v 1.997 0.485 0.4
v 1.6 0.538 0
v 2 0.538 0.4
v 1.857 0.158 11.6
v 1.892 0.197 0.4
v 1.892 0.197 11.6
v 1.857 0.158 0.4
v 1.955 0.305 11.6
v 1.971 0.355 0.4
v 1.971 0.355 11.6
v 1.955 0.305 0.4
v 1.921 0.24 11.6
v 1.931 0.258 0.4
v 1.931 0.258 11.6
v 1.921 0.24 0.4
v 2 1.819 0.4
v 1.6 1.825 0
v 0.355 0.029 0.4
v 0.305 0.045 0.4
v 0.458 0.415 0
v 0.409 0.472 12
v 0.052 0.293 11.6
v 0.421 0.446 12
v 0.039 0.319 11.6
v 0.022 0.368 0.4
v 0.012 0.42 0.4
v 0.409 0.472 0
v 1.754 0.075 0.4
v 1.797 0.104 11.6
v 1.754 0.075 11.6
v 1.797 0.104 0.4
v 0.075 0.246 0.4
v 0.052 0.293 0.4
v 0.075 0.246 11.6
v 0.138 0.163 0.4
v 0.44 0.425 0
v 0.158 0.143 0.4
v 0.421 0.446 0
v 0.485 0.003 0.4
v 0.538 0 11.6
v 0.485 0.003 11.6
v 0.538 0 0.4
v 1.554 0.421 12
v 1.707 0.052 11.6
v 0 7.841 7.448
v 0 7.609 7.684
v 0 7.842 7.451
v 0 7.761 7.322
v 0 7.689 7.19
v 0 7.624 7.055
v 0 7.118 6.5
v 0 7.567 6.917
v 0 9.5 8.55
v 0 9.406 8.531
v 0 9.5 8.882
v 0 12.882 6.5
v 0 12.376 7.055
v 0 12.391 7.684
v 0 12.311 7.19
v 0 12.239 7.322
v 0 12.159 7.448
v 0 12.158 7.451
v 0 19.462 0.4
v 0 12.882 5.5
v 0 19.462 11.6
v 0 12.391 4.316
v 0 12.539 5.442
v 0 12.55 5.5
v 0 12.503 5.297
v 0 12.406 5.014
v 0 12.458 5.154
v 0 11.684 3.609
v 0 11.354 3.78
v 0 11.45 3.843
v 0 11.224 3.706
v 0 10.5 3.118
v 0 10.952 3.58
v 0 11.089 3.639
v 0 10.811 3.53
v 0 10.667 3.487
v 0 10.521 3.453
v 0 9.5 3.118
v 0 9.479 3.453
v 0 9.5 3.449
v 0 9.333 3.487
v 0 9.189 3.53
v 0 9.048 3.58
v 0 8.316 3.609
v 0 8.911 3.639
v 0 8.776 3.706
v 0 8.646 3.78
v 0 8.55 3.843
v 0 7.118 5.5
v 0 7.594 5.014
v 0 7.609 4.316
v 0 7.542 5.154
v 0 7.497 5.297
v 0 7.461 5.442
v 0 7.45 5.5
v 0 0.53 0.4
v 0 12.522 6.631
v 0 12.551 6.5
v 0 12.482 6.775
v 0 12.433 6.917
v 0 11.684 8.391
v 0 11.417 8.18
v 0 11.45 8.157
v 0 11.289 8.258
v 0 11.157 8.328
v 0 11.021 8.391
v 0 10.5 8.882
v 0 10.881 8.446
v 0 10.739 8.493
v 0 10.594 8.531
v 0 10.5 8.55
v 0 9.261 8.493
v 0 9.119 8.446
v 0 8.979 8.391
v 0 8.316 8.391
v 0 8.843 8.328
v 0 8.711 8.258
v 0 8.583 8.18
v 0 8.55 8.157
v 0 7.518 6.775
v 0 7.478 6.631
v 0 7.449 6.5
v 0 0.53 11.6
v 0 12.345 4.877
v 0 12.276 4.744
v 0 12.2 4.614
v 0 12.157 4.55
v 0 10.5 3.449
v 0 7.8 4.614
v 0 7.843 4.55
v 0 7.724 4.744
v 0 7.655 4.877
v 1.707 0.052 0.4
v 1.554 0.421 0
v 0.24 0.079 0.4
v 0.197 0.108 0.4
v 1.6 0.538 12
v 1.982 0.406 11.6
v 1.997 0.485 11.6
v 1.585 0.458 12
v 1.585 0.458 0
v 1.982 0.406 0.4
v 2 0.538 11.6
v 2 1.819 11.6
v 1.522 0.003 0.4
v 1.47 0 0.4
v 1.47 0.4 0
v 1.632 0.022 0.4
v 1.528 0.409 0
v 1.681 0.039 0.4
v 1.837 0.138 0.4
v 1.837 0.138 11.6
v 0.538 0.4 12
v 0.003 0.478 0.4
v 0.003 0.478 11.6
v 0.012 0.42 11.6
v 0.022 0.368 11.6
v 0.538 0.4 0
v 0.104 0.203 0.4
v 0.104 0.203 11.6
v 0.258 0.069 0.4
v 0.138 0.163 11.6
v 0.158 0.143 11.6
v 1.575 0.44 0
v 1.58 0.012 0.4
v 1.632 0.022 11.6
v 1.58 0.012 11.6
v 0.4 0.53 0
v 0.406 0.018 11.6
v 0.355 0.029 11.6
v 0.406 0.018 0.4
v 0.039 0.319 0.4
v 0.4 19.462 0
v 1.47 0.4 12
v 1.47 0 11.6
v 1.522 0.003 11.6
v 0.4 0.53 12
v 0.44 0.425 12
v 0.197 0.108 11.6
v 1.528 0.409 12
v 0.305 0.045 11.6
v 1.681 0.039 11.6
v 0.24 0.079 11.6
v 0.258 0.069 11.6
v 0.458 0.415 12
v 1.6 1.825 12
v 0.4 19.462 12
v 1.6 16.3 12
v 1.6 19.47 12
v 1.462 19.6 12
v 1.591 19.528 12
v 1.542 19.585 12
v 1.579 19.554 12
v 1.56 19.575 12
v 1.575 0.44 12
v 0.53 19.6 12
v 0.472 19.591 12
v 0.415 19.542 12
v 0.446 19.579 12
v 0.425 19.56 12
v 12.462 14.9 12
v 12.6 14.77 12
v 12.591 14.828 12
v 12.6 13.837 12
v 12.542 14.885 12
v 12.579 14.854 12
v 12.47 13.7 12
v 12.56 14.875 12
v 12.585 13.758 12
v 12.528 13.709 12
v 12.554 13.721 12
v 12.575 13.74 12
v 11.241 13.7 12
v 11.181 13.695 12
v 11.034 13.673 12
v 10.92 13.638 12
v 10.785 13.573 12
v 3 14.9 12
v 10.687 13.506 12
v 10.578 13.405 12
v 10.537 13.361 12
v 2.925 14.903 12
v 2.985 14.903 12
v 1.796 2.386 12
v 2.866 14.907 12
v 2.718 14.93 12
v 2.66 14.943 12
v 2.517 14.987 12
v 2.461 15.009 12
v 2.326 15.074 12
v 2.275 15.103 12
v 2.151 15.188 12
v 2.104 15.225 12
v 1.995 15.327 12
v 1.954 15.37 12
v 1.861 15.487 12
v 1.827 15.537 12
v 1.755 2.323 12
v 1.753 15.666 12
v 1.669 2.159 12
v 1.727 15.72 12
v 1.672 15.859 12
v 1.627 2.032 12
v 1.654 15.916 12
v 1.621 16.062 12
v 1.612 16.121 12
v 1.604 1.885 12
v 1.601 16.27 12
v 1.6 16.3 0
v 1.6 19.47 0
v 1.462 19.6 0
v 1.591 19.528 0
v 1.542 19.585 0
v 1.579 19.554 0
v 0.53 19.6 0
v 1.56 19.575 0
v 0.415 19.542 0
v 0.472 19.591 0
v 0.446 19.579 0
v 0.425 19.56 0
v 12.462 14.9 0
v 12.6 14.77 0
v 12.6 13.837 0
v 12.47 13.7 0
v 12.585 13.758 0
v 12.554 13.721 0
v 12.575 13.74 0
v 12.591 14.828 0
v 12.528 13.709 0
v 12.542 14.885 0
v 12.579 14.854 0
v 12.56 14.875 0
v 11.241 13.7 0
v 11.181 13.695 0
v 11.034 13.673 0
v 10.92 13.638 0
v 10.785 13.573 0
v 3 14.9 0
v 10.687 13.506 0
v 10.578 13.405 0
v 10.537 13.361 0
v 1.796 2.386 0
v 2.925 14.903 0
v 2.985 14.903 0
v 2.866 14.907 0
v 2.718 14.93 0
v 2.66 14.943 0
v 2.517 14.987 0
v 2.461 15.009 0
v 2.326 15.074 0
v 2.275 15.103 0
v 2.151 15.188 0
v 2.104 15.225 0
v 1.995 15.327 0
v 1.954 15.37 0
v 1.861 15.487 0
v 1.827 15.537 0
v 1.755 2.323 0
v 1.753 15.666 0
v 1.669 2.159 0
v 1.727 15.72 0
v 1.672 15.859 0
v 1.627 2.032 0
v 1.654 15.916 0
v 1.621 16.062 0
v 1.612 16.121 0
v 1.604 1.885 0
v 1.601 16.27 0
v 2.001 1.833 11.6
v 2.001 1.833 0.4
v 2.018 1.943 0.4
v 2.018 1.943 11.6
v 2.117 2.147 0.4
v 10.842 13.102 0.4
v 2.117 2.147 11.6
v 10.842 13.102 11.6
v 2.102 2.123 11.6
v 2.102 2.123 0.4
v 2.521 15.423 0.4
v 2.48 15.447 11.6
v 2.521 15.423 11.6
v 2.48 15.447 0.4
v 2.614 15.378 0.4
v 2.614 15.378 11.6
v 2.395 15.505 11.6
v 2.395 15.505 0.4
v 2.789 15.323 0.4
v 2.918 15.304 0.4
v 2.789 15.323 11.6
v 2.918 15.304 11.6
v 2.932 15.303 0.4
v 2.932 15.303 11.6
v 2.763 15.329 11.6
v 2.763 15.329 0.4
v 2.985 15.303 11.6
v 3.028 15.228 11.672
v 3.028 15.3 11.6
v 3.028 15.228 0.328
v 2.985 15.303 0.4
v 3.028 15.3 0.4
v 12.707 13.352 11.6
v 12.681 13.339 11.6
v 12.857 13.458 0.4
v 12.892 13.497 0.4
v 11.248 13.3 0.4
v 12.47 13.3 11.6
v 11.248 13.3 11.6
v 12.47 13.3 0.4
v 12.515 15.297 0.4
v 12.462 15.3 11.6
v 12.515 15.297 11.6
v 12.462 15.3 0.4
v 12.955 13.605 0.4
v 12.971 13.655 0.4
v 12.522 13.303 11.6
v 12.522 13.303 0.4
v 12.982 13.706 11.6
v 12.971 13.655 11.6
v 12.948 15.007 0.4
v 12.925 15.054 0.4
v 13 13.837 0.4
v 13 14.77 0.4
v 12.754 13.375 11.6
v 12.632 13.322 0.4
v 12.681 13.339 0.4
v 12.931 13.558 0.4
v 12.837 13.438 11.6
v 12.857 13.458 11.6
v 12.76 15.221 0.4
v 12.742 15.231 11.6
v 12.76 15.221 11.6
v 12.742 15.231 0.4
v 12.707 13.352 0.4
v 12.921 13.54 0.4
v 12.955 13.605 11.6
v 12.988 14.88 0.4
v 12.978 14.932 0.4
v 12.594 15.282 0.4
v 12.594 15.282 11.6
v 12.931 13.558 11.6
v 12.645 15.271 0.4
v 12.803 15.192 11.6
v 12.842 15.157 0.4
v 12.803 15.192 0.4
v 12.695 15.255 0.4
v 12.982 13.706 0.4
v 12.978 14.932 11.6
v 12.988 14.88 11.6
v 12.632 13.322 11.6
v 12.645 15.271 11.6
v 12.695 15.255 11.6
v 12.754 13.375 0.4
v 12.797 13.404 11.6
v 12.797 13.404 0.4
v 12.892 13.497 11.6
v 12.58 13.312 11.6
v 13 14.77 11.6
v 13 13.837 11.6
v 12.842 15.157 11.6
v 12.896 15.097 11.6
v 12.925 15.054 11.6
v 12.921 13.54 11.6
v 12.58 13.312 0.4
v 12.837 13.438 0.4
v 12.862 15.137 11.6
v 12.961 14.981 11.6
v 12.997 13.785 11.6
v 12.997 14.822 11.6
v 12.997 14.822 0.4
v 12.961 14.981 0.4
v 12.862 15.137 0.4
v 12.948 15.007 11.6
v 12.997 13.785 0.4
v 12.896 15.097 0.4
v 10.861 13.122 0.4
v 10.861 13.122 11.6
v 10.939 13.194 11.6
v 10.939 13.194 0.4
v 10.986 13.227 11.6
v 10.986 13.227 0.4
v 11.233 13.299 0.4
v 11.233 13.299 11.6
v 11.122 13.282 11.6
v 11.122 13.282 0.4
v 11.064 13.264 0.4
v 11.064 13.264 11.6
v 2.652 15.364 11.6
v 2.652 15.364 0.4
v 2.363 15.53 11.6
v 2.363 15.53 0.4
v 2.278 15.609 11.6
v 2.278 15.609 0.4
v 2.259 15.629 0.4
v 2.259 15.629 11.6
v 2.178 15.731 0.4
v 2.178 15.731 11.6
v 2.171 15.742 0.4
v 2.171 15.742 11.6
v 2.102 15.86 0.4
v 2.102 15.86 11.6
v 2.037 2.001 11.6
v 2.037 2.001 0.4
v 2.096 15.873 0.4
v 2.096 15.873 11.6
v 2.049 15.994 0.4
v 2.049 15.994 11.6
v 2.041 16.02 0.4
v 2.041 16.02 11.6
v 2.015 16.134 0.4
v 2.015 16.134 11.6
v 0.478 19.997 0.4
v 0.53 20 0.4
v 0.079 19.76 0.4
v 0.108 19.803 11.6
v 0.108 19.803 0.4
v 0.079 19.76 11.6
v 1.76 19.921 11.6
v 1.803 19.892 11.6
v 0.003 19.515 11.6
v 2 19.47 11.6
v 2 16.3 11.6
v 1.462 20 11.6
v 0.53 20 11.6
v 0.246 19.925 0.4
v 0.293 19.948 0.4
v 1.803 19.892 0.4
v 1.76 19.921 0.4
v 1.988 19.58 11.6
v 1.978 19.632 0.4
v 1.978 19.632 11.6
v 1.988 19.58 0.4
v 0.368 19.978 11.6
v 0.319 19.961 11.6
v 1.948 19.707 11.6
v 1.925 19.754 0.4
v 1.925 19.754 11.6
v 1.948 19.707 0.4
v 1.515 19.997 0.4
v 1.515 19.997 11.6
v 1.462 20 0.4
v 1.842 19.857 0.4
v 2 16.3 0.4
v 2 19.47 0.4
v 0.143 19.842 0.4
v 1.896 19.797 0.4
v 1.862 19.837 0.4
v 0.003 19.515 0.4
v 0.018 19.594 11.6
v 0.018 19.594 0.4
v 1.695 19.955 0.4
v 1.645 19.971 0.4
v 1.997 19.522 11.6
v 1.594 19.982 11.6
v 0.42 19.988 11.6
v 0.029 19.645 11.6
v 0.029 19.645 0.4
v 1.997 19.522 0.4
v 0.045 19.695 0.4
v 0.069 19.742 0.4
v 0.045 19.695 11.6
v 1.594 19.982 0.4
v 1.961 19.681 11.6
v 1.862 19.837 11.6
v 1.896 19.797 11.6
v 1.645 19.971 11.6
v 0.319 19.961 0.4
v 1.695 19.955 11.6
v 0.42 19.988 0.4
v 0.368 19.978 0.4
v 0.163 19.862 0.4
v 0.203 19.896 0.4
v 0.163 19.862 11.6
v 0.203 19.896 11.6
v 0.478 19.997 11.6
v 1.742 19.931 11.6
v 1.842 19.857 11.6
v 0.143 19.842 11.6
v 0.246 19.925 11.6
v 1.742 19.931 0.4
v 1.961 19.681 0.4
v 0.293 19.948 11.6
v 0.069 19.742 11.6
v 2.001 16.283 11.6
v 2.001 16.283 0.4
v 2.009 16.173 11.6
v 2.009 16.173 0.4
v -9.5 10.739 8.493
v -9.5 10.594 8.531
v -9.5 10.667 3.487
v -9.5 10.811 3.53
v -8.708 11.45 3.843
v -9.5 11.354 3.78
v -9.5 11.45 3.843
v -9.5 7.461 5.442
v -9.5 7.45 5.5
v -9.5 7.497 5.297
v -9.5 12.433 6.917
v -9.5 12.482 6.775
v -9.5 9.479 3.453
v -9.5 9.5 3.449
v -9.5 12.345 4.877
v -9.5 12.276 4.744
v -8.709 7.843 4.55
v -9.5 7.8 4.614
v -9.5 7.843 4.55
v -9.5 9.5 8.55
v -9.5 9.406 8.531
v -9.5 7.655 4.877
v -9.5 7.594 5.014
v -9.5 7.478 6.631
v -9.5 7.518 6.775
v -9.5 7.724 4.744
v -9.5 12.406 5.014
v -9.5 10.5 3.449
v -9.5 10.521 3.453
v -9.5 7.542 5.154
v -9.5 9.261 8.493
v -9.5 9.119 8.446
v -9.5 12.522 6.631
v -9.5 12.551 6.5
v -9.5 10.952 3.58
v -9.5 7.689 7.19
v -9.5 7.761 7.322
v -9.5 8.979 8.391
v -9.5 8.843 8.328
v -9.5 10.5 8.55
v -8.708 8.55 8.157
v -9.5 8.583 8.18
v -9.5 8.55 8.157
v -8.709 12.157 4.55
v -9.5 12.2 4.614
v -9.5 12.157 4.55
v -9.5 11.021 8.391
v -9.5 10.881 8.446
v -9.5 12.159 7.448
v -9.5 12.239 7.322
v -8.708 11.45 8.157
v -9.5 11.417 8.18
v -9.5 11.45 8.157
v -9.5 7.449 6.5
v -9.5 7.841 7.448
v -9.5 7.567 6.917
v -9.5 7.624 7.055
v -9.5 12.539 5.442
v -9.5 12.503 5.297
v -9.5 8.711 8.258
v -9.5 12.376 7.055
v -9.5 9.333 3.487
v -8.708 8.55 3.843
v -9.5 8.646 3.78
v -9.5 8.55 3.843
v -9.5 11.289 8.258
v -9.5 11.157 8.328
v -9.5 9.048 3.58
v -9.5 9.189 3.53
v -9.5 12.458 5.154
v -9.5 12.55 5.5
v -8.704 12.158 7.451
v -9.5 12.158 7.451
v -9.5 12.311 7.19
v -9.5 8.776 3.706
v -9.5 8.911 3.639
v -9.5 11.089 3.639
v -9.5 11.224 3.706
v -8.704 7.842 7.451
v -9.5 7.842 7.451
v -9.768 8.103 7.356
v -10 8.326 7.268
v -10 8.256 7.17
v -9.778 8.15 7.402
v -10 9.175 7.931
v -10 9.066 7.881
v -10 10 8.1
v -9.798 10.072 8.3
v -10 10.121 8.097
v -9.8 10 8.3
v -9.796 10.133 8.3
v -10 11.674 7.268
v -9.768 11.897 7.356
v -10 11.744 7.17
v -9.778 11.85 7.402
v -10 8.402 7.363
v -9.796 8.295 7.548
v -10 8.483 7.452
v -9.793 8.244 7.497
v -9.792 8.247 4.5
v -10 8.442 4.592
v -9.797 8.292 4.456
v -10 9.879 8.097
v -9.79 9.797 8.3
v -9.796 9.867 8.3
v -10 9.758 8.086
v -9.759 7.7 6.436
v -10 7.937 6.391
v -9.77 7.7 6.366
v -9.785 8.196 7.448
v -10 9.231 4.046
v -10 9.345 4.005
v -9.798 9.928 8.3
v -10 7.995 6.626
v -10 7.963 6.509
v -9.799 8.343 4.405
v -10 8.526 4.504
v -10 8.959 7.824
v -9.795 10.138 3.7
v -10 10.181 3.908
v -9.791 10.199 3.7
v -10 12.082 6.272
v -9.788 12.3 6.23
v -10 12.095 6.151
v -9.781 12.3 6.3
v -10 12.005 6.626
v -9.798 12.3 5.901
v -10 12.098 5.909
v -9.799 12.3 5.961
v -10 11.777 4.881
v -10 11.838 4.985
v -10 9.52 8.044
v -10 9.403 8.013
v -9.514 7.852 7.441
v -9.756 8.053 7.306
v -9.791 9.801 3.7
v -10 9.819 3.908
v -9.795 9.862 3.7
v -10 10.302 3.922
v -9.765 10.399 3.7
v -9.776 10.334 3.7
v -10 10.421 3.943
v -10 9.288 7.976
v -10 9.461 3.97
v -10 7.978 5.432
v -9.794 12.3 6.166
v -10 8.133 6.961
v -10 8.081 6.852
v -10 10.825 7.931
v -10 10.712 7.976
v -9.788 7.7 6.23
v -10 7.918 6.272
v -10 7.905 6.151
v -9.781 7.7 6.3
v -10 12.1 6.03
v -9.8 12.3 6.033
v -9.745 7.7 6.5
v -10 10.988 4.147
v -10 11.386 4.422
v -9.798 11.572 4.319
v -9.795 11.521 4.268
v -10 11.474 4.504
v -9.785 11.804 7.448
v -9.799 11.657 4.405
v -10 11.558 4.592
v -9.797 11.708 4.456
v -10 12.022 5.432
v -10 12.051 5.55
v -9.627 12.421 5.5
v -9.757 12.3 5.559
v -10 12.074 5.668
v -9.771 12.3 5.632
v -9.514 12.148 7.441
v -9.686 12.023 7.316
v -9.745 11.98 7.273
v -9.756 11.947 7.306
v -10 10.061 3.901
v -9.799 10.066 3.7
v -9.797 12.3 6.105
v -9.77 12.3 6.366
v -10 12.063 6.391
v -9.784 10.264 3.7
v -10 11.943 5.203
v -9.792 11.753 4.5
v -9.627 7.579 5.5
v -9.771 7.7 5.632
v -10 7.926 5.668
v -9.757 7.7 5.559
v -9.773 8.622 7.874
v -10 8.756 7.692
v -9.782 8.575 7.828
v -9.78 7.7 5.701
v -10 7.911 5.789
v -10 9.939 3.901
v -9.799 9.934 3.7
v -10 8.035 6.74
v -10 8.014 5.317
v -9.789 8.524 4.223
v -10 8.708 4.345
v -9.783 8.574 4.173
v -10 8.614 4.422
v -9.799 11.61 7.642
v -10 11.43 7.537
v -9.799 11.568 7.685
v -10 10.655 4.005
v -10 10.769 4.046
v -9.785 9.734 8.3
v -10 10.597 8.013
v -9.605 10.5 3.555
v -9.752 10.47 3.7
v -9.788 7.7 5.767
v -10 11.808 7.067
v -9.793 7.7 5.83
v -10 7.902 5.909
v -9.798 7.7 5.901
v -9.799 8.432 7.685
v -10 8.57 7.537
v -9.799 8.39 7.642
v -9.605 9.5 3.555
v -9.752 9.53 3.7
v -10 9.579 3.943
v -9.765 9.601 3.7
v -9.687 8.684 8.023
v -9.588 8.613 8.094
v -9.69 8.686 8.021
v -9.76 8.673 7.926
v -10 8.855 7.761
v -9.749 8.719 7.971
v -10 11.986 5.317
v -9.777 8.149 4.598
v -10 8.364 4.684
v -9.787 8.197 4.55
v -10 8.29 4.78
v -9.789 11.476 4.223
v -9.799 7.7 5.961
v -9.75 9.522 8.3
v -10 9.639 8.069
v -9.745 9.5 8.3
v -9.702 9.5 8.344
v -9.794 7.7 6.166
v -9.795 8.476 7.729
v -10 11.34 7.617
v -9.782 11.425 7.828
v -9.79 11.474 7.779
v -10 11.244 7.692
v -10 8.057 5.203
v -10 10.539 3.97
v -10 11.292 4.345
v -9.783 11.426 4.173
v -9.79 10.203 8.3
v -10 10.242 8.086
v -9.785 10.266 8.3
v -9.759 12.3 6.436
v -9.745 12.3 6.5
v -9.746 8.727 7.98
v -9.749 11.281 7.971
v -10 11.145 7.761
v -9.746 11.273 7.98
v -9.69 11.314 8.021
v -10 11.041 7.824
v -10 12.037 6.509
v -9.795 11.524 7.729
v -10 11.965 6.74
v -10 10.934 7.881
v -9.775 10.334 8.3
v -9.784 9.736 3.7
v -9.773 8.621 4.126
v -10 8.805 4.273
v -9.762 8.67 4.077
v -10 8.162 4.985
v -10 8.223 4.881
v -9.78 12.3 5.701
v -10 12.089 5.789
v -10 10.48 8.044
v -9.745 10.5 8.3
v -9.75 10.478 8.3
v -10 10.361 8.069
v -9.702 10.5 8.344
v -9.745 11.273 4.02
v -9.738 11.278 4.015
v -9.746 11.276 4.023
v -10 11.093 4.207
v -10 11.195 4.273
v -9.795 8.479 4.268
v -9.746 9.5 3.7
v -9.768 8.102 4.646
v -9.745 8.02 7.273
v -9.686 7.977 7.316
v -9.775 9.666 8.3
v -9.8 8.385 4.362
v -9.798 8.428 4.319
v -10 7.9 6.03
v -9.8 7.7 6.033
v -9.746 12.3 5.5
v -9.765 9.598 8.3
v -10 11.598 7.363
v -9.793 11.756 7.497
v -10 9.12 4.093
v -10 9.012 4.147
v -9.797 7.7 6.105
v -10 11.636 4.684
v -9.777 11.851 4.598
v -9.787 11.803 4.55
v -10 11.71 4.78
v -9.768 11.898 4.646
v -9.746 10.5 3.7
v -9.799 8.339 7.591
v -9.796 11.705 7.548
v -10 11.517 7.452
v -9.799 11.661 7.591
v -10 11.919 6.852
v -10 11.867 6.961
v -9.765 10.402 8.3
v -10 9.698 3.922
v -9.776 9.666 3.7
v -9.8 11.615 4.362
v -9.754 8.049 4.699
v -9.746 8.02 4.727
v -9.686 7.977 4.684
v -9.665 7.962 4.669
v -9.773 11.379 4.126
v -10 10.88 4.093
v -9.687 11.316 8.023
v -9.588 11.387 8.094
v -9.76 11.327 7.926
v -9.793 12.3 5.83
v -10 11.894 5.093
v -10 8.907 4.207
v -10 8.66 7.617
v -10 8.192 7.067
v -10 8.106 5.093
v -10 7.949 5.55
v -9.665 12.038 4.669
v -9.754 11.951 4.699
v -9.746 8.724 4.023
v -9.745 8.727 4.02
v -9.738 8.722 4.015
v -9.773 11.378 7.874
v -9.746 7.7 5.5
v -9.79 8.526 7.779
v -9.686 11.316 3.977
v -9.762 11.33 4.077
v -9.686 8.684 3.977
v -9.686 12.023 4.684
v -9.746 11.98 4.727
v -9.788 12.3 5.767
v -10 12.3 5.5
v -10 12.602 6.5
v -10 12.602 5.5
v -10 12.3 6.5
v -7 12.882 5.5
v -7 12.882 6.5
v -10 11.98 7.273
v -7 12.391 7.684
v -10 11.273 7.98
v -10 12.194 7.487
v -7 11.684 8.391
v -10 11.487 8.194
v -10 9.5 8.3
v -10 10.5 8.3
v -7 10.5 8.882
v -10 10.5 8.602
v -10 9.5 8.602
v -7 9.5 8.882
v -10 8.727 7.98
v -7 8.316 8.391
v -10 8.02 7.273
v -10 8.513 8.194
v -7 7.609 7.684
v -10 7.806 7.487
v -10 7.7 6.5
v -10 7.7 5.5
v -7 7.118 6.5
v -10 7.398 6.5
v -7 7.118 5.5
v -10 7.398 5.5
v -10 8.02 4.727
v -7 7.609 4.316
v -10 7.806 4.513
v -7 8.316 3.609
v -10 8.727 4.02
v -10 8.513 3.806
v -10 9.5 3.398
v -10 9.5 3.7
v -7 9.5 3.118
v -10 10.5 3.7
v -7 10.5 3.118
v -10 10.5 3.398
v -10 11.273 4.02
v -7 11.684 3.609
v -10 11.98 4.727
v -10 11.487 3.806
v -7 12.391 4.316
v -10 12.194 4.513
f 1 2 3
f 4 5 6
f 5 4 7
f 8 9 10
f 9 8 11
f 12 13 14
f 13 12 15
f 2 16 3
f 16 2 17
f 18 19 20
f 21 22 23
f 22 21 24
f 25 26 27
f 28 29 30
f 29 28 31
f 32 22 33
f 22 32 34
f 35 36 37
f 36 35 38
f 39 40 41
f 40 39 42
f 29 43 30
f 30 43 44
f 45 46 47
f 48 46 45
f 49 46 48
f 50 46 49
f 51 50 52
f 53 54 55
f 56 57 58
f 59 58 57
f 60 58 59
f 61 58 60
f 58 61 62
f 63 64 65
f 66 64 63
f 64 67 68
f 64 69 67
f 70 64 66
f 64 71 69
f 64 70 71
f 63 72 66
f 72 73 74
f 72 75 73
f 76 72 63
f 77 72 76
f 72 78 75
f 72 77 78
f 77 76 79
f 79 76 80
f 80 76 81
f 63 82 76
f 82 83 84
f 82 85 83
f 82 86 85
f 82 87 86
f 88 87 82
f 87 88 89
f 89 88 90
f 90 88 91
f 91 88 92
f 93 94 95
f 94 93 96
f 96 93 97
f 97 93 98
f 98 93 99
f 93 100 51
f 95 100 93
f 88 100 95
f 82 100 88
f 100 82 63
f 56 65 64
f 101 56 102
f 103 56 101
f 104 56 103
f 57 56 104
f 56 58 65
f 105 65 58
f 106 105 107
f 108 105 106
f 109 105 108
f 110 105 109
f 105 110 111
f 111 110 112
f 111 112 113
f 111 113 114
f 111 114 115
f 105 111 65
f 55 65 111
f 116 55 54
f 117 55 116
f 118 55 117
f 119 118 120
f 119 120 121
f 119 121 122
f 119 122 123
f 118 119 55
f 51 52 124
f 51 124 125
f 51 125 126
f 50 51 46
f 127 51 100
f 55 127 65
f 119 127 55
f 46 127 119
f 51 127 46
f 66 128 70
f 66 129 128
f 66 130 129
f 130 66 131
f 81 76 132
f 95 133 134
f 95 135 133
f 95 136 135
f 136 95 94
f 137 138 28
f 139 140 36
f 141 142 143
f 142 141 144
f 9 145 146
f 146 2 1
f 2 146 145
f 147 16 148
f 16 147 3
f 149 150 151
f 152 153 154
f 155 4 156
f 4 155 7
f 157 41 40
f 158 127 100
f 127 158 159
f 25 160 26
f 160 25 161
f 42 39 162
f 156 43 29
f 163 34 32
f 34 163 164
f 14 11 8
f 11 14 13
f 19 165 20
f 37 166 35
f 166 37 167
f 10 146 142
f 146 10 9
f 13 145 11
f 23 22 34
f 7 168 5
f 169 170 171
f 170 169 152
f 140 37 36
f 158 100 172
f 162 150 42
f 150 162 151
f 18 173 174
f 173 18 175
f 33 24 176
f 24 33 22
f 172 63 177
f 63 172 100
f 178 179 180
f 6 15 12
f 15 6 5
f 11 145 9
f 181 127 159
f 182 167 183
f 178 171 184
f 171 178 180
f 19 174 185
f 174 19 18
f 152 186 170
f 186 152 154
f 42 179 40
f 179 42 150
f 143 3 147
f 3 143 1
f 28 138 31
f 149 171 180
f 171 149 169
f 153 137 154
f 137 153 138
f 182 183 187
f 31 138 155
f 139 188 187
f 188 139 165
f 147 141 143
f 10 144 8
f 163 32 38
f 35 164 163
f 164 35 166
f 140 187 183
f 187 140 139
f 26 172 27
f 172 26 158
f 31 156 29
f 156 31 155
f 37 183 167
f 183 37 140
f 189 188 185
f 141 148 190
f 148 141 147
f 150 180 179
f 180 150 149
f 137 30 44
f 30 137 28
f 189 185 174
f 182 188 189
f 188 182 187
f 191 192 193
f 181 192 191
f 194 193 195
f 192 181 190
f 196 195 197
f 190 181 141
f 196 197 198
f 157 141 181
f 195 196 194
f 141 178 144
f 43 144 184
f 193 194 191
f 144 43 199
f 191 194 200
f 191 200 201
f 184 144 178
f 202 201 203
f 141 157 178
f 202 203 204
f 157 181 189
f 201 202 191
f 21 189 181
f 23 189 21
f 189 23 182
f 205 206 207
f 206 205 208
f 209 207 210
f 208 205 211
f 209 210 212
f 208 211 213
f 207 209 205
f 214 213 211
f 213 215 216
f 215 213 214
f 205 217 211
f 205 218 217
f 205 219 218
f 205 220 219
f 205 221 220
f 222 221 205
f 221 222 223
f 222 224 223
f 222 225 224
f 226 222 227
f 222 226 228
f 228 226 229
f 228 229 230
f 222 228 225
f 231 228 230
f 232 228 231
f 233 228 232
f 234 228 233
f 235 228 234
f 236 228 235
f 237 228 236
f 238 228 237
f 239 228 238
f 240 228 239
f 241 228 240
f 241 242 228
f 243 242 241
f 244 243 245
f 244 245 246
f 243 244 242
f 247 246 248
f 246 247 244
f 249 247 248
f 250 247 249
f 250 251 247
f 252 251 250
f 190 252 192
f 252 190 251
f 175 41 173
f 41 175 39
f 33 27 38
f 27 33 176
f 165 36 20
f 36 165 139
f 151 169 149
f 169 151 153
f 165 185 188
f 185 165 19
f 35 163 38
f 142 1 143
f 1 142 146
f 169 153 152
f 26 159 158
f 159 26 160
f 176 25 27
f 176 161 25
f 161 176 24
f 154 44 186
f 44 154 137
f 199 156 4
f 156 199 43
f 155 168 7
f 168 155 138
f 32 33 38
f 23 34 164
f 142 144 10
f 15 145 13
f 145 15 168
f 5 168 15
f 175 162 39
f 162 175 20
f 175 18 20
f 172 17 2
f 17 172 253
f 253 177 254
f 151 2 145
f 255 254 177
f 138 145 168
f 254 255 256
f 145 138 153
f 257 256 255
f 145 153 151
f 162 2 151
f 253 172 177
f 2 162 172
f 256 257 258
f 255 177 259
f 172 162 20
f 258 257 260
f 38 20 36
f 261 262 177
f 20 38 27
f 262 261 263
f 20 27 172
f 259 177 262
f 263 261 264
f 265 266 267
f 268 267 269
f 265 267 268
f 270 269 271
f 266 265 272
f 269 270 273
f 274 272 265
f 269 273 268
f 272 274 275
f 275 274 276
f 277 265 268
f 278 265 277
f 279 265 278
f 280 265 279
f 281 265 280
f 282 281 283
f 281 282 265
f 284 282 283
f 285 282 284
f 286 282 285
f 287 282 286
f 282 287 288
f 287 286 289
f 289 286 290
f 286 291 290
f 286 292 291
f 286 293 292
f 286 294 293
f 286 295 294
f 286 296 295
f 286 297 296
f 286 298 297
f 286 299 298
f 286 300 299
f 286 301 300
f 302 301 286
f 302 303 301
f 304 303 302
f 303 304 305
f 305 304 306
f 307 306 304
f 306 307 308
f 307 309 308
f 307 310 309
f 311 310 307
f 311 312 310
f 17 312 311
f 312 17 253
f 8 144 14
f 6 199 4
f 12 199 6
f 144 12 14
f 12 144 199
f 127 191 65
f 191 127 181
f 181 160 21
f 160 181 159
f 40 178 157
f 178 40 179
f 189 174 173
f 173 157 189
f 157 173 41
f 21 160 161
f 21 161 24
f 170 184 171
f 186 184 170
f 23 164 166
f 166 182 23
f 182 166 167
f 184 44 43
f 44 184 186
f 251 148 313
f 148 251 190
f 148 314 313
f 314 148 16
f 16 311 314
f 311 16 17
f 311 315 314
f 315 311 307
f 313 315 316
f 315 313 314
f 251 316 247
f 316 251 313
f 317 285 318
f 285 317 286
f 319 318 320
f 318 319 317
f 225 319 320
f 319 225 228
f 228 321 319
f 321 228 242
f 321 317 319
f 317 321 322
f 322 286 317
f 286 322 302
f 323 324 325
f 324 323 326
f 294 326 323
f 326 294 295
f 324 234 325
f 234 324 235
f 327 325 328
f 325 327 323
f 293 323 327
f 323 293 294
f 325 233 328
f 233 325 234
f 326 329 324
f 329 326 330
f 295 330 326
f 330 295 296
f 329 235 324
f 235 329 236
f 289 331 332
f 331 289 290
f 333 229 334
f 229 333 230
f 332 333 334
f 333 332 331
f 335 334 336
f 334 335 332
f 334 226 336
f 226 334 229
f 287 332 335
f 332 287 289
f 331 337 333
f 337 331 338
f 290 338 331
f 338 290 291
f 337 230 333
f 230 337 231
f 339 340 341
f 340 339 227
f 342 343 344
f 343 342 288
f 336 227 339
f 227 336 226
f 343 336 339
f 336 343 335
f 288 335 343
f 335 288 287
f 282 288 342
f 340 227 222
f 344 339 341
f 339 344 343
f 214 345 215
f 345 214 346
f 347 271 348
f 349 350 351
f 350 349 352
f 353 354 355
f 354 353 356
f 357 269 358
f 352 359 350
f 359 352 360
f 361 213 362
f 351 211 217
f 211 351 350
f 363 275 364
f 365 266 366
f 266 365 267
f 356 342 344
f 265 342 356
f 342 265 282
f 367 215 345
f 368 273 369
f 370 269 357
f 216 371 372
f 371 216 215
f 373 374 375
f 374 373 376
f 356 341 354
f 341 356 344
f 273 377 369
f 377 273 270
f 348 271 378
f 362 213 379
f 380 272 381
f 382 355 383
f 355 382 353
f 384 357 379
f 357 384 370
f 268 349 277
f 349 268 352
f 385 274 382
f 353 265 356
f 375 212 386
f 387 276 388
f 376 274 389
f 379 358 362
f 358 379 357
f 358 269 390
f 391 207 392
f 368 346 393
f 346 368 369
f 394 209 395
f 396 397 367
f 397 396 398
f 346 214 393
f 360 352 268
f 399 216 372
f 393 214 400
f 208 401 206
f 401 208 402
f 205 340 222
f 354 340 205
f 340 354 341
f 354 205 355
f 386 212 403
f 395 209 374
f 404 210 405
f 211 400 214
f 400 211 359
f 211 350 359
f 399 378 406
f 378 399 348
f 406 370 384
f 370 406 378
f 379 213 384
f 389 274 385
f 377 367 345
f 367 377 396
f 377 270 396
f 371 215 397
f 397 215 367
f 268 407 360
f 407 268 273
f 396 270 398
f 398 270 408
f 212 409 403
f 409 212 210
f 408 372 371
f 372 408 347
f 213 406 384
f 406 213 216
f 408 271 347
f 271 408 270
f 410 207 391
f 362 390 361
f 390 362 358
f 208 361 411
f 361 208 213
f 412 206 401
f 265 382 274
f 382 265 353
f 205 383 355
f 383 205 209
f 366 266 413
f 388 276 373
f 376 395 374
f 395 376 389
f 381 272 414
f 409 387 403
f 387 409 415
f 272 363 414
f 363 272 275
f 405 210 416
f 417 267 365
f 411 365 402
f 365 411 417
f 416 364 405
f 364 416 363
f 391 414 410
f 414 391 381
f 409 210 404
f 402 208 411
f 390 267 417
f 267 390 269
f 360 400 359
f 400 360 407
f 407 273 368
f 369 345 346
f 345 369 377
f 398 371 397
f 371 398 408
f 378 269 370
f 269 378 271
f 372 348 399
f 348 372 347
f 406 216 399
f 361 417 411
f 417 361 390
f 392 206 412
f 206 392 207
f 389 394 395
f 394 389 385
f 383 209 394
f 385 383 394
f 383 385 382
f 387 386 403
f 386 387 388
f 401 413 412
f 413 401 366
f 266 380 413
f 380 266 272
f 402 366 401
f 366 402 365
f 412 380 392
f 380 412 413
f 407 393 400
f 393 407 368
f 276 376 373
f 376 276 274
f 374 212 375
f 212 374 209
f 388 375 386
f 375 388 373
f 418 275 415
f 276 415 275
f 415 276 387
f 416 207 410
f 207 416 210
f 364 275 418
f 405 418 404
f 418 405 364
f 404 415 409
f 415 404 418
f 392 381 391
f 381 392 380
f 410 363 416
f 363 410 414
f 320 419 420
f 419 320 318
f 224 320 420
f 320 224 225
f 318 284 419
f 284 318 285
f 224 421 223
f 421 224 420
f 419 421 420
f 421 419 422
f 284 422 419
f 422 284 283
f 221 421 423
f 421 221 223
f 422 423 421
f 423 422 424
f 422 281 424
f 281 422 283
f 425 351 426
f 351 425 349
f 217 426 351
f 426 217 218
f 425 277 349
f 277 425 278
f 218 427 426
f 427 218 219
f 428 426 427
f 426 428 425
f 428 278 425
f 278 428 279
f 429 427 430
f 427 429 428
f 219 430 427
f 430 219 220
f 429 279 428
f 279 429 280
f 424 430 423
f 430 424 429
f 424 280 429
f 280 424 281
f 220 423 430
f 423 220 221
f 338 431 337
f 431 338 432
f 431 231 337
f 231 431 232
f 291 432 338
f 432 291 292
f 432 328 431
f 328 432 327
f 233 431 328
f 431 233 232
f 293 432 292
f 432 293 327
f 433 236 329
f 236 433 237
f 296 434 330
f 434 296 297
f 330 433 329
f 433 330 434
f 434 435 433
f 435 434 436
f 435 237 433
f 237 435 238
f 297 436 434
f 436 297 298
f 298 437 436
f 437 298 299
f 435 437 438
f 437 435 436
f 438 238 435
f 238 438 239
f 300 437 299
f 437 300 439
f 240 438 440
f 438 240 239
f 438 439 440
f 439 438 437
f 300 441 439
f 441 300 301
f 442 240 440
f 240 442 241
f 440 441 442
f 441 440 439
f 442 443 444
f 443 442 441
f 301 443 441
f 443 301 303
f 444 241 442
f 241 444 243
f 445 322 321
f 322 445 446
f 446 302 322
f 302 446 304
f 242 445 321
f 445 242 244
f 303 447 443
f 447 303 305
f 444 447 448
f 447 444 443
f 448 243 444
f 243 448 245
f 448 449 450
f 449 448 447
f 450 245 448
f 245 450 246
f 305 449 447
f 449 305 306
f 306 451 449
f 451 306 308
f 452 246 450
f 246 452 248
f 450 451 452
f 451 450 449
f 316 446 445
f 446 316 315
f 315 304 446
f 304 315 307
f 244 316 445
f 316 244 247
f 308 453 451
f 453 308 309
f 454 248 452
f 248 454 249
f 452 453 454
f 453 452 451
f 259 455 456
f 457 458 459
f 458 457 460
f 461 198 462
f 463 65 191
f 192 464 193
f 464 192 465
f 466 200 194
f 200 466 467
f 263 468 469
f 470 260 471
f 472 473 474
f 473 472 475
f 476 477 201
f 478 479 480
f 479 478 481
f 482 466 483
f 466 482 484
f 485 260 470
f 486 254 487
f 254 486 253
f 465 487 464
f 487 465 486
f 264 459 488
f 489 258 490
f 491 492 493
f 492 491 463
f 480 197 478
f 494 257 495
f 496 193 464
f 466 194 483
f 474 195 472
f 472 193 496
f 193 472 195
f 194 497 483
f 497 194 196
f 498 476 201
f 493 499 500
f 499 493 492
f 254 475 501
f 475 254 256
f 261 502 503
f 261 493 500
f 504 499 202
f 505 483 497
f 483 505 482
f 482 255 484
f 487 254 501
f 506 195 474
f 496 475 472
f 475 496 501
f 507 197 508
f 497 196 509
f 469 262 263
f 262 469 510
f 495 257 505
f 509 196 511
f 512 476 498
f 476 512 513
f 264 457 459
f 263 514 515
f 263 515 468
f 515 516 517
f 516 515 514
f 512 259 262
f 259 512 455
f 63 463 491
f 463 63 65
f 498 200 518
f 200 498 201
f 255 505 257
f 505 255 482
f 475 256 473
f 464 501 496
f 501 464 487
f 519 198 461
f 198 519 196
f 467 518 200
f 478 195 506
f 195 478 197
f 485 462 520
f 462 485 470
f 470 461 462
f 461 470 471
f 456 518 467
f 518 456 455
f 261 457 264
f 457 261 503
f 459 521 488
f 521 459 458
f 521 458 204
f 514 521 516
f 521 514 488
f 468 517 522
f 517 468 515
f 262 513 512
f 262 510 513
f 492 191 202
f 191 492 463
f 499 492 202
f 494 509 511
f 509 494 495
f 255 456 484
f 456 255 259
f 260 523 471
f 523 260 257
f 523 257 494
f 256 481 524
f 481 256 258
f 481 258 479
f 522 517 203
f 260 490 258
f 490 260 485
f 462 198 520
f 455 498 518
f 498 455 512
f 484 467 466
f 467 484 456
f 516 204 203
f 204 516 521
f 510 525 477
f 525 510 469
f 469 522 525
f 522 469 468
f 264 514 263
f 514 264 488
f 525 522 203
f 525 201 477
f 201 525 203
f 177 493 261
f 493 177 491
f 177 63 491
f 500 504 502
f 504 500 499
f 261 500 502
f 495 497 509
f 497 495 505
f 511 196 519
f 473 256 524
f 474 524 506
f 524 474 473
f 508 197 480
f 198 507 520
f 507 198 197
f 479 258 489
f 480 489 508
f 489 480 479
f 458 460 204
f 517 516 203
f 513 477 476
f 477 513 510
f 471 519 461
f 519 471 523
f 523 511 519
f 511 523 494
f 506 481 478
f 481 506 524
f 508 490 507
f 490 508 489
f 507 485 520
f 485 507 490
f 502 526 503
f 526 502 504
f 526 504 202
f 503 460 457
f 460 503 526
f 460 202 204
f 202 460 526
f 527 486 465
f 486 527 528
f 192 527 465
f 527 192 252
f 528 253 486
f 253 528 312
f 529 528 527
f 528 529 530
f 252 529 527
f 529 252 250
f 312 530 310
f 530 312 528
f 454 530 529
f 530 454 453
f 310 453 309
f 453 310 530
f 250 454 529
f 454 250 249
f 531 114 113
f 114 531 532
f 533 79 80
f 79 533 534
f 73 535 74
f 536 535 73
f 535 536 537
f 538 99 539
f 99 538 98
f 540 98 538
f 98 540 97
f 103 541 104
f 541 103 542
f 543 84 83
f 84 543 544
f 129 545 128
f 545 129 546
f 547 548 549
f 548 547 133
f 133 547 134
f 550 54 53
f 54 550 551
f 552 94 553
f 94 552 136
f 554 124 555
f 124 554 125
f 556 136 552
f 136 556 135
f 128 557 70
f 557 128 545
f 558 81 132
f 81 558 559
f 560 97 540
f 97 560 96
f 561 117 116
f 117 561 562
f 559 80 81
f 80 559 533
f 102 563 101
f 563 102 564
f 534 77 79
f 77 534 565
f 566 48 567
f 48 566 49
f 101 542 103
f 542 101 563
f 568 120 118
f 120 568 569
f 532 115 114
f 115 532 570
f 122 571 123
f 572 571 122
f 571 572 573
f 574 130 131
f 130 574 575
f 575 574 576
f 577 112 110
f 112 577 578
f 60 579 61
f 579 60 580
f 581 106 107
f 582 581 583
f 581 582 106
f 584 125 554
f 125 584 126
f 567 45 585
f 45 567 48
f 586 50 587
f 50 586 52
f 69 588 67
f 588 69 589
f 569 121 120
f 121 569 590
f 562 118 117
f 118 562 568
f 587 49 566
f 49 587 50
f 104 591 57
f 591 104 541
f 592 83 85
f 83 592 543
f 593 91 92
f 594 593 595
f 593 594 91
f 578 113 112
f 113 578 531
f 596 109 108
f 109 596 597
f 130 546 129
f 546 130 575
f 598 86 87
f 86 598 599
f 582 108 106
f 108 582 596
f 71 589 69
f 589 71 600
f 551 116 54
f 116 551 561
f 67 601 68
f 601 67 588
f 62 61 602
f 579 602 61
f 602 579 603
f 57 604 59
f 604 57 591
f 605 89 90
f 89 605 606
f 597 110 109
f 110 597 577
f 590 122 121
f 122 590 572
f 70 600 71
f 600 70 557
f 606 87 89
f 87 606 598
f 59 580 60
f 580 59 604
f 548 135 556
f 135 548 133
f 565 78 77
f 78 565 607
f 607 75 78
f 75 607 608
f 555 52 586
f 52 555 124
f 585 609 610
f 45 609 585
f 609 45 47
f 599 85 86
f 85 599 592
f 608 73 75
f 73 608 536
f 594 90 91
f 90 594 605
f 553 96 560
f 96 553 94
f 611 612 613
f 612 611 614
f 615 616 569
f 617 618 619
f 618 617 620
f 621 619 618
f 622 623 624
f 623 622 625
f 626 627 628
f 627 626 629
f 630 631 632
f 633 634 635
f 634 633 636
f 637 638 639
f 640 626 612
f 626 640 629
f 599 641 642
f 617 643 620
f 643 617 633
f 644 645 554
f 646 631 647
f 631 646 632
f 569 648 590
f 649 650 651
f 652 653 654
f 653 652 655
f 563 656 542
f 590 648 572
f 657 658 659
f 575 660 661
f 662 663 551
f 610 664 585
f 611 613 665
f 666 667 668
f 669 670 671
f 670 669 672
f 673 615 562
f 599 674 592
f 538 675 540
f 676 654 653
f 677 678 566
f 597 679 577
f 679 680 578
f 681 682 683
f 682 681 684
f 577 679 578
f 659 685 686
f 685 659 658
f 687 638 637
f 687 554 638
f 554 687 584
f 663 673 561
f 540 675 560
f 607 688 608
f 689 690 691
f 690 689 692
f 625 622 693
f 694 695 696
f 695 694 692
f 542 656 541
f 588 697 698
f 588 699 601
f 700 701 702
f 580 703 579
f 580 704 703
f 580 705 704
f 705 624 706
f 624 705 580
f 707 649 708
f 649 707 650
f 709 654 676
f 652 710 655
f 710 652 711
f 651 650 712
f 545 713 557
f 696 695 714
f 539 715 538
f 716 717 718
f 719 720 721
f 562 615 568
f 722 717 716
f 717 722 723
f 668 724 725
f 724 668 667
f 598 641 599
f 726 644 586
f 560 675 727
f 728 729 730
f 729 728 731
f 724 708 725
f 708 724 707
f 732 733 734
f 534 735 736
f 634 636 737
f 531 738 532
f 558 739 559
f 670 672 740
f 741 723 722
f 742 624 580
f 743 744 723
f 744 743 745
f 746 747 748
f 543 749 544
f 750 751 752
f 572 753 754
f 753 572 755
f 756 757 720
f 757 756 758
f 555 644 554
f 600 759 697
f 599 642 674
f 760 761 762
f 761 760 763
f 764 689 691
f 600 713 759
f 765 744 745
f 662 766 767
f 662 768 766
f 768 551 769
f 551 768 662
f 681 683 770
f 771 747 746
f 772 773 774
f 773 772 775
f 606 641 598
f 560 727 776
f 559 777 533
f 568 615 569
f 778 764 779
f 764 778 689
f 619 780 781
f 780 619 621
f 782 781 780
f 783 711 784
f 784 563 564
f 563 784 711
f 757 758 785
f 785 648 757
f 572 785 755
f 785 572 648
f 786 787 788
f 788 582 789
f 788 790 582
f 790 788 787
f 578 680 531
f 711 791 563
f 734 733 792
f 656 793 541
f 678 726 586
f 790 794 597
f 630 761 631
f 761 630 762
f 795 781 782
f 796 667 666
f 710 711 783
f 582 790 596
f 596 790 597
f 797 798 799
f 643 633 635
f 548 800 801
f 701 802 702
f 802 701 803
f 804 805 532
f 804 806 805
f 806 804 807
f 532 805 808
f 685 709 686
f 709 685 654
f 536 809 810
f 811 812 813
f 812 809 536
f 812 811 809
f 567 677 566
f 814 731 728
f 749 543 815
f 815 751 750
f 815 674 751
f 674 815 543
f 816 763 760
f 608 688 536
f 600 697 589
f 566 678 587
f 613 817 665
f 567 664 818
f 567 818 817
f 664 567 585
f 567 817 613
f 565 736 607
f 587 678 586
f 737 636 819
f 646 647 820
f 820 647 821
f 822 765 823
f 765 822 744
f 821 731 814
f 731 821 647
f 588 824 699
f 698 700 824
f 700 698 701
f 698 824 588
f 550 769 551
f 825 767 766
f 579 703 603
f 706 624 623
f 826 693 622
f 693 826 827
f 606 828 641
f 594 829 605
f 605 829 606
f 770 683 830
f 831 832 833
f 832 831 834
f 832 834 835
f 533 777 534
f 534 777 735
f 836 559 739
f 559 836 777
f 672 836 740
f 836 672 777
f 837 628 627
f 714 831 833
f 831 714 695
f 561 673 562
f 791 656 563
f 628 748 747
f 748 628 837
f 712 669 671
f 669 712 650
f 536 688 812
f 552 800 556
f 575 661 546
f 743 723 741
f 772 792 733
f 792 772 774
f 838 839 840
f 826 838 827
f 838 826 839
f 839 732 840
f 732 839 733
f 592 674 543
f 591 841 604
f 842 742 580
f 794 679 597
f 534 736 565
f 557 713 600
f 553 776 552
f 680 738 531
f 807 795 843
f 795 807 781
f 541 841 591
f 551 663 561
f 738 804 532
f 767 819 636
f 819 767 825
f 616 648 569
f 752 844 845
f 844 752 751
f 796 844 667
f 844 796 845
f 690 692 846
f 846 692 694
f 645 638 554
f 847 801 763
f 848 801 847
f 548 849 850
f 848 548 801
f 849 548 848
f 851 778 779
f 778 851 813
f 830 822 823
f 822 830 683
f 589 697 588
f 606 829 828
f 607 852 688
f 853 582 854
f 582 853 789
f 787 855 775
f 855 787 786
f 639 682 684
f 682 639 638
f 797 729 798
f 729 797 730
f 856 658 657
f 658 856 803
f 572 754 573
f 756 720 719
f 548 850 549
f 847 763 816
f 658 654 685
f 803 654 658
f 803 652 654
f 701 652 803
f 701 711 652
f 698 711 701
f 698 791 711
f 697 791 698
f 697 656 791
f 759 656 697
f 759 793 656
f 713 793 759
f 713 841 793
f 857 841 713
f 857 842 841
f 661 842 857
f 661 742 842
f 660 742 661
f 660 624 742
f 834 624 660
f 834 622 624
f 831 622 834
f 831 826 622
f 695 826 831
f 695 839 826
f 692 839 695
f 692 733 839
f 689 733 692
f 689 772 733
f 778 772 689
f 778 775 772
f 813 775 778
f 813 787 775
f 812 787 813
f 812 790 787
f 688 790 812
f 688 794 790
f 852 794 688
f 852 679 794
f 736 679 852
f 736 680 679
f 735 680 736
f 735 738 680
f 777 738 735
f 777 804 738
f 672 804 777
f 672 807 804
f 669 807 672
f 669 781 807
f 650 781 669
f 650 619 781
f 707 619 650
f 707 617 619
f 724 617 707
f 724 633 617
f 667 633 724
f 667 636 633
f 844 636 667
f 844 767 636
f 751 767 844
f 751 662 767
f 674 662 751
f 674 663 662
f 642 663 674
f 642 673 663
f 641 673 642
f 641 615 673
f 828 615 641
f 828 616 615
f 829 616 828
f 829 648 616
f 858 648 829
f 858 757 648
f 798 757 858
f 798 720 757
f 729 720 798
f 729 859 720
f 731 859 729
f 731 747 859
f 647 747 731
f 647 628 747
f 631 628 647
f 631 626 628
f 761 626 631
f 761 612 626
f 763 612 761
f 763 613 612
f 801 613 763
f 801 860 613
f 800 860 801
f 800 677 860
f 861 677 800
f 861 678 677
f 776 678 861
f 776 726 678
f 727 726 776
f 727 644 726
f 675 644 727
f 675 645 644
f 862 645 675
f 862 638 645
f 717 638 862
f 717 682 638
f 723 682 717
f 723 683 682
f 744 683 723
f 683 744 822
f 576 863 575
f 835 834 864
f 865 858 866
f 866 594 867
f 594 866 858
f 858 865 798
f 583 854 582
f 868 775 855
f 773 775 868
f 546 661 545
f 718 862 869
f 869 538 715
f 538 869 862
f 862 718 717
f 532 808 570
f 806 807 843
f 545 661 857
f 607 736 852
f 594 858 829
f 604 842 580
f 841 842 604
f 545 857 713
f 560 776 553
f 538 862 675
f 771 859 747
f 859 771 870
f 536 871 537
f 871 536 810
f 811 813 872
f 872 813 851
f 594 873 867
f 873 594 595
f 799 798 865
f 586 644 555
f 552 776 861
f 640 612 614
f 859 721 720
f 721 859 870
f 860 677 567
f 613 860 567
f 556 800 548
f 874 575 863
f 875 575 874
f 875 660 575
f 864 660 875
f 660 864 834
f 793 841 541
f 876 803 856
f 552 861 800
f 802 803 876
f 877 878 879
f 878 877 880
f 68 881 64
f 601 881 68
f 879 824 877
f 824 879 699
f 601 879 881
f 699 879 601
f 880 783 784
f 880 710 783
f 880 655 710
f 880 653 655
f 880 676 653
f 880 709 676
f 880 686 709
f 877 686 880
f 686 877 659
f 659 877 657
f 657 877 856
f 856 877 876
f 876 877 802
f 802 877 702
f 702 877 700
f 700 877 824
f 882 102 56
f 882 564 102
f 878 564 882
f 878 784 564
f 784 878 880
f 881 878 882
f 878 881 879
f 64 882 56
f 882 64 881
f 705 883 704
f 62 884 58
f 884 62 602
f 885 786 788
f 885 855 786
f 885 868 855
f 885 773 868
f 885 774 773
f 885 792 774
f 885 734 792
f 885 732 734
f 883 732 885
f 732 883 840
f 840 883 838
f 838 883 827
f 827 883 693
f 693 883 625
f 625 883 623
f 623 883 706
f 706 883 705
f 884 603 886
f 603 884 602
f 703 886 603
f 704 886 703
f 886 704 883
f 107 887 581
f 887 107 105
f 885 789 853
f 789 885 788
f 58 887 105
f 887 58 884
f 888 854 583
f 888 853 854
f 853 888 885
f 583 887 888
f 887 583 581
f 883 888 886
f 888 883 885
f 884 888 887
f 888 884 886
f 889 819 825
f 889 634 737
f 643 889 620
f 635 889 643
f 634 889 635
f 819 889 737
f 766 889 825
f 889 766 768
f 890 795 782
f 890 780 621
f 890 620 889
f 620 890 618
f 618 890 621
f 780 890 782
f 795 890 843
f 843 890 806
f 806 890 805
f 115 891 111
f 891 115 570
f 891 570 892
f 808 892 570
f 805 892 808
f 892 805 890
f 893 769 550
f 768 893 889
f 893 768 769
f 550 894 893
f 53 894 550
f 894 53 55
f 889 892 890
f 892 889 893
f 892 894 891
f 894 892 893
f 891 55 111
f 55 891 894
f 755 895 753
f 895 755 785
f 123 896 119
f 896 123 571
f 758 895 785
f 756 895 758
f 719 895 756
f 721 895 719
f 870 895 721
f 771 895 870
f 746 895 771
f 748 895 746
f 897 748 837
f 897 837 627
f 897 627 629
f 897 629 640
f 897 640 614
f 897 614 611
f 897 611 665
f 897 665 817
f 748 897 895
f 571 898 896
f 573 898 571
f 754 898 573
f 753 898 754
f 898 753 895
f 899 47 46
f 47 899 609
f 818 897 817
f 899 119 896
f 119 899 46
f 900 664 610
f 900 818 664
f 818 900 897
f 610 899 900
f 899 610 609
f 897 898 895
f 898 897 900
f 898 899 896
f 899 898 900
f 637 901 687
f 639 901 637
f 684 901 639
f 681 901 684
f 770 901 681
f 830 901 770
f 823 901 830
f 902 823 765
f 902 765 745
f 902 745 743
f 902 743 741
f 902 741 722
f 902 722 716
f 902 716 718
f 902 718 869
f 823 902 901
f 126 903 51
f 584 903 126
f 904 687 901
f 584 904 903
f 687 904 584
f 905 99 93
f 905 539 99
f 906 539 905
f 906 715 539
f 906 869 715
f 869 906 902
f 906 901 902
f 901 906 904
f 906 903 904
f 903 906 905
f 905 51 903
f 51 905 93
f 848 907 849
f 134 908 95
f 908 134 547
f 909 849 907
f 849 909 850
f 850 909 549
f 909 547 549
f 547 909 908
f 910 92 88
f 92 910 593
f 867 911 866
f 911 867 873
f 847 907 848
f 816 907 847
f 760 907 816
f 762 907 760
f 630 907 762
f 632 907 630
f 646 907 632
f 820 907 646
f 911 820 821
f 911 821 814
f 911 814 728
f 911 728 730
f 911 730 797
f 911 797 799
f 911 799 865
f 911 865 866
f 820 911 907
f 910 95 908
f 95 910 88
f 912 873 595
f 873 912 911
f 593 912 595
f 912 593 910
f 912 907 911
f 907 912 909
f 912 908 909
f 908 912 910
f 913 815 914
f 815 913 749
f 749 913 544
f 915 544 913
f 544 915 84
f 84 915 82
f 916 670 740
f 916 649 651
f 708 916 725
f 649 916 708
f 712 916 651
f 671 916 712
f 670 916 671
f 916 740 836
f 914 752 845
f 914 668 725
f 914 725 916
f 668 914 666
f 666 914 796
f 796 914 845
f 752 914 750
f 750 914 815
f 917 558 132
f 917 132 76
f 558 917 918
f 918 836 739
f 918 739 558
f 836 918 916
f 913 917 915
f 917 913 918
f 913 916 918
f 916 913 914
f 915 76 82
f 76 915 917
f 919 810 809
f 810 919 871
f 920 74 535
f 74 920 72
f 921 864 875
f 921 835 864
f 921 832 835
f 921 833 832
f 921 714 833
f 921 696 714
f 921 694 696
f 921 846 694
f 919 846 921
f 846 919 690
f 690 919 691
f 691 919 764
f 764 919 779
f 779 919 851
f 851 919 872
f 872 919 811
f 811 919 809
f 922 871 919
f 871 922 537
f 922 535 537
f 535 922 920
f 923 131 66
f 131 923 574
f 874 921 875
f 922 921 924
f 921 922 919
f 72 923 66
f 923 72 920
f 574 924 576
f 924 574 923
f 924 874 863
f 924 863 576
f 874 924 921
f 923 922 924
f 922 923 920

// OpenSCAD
// =====================================================================
//  17_CABINET_SHELF_PIN.SCAD — Crush-Ribbed Cabinet Shelf Support Pin
//  Prints lying on its side so shelf load runs parallel to layer lines!
// =====================================================================

/* [1. Cabinet Hole & Shank Sizing] */
// Cabinet Drill Hole Diameter (mm) [5.0:5.0 mm (Standard Euro 5mm Shelf Pin), 5.5:5.5 mm (7/32" Drill — Tested Default), 6.0:6.0 mm (6mm Dowel Hole), 6.35:6.35 mm (1/4" Standard American Shelf Pin), 7.0:7.0 mm, 8.0:8.0 mm (5/16" Heavy Pin)]
hole_d = 5.5;

// Pin Shank Length Inside Hole (mm) [8:8 mm (Shallow), 10:10 mm (Standard Default), 12:12 mm (Deep), 15:15 mm (Extra Deep)]
shank_length = 10;

// Crush-Rib Interference Fit (mm) [0.20:0.20 mm (Light Push Fit), 0.35:0.35 mm (Tested Standard Grip), 0.50:0.50 mm (Heavy Hammer-In Fit)]
interference = 0.35;

/* [2. Bracket Body & Batch Quantity] */
// Pin Body Width (mm) [12:12 mm (Standard), 14:14 mm (Wide), 16:16 mm (Extra Wide — Required for >=8mm Holes)]
pin_width = 12;

// Shelf Support Ledge Depth (mm) [9:9 mm, 11:11 mm (Standard Stock Pin), 14:14 mm (Extended Ledge), 18:18 mm (Deep Shelf Ledge)]
ledge_depth = 11;

// Quantity of Shelf Pins to Print on Plate [1:1 Pin, 4:4 Pins (1 Shelf Set), 8:8 Pins (2 Shelves), 12:12 Pins (3 Shelves), 16:16 Pins (4 Shelves)]
quantity = 1;

/* [Hidden] */
W = max(pin_width, ceil(hole_d + interference + 2.5));
T = 2;
PLATE_H = 20;
SHANK_Y = 10;
LEDGE_ABOVE_HOLE = 5.3;
LEDGE_T = 2;
LEDGE_DEPTH = ledge_depth;
GUSSET_FOOT = 2;
GUSSET_TIP = min(ledge_depth - 2, 9);
FILLET = 0.5;
ROOT_FILLET = 1;
CHAMFER = 0.4;

N_RIBS = 8;
RIB_W = 1;
RIB_TAPER = 3;
CORE_CLEAR = 0.3;
TIP_UNDER = 0.2;
TIP_CHAMFER = 0.5;
SINK = 0.5;

$fa = 2; $fs = 0.15;

assert(hole_d + interference <= W - 2, "hole too big for pin width");
assert(shank_length > RIB_TAPER + TIP_CHAMFER, "shank too short");

TOP = SHANK_Y + LEDGE_ABOVE_HOLE;
BOT = TOP - LEDGE_T;
TIP = T + LEDGE_DEPTH;

echo(str("[SPEC] Cabinet Shelf Pin: Hole Ø", hole_d, " mm × ", shank_length, " mm Shank | Crush Interference: +", interference, " mm | Qty: ", quantity));

module raw_profile() {
    polygon([[0, 0], [T, 0], [T, GUSSET_FOOT], [T + GUSSET_TIP, BOT],
             [TIP, BOT], [TIP, TOP], [T, TOP], [T, PLATE_H], [0, PLATE_H]]);
}

module profile() {
    union() {
        offset(r = FILLET) offset(delta = -FILLET)
            offset(r = -FILLET) offset(delta = FILLET) raw_profile();
        difference() {
            translate([T, TOP]) square(ROOT_FILLET);
            translate([T + ROOT_FILLET, TOP + ROOT_FILLET]) circle(r = ROOT_FILLET);
        }
    }
}

module body() {
    minkowski() {
        translate([0, 0, CHAMFER])
            linear_extrude(W - 2 * CHAMFER) offset(r = -CHAMFER) profile();
        union() {
            cylinder(h = CHAMFER, r1 = CHAMFER, r2 = 0, $fn = 48);
            mirror([0, 0, 1]) cylinder(h = CHAMFER, r1 = CHAMFER, r2 = 0, $fn = 48);
        }
    }
}

function corner(d) = sqrt(pow(d / 2, 2) - pow(RIB_W / 2, 2));

module shank() {
    core_r = (hole_d - CORE_CLEAR) / 2;
    r_full = corner(hole_d + interference);
    r_tip = corner(hole_d - TIP_UNDER);
    r_in = core_r - 0.3;
    L = shank_length;
    translate([0, SHANK_Y, W / 2]) {
        rotate([0, -90, 0]) translate([0, 0, -SINK]) {
            cylinder(h = L + SINK - TIP_CHAMFER, r = core_r);
            translate([0, 0, L + SINK - TIP_CHAMFER])
                cylinder(h = TIP_CHAMFER, r1 = core_r, r2 = core_r - TIP_CHAMFER);
        }
        for (i = [0 : N_RIBS - 1])
            rotate([360 / N_RIBS * i, 0, 0])
                linear_extrude(RIB_W, center = true)
                    polygon([[SINK, r_in], [SINK, r_full], [-(L - RIB_TAPER), r_full],
                             [-L, r_tip], [-L, r_in]]);
    }
}

module single_pin() {
    body();
    shank();
}

cols = ceil(sqrt(quantity));
cell_x = shank_length + TIP + 8;
cell_y = PLATE_H + 6;

for (i = [0 : quantity - 1]) {
    cx = (i % cols) * cell_x;
    cy = floor(i / cols) * cell_y;
    translate([cx, cy, 0]) single_pin();
}
